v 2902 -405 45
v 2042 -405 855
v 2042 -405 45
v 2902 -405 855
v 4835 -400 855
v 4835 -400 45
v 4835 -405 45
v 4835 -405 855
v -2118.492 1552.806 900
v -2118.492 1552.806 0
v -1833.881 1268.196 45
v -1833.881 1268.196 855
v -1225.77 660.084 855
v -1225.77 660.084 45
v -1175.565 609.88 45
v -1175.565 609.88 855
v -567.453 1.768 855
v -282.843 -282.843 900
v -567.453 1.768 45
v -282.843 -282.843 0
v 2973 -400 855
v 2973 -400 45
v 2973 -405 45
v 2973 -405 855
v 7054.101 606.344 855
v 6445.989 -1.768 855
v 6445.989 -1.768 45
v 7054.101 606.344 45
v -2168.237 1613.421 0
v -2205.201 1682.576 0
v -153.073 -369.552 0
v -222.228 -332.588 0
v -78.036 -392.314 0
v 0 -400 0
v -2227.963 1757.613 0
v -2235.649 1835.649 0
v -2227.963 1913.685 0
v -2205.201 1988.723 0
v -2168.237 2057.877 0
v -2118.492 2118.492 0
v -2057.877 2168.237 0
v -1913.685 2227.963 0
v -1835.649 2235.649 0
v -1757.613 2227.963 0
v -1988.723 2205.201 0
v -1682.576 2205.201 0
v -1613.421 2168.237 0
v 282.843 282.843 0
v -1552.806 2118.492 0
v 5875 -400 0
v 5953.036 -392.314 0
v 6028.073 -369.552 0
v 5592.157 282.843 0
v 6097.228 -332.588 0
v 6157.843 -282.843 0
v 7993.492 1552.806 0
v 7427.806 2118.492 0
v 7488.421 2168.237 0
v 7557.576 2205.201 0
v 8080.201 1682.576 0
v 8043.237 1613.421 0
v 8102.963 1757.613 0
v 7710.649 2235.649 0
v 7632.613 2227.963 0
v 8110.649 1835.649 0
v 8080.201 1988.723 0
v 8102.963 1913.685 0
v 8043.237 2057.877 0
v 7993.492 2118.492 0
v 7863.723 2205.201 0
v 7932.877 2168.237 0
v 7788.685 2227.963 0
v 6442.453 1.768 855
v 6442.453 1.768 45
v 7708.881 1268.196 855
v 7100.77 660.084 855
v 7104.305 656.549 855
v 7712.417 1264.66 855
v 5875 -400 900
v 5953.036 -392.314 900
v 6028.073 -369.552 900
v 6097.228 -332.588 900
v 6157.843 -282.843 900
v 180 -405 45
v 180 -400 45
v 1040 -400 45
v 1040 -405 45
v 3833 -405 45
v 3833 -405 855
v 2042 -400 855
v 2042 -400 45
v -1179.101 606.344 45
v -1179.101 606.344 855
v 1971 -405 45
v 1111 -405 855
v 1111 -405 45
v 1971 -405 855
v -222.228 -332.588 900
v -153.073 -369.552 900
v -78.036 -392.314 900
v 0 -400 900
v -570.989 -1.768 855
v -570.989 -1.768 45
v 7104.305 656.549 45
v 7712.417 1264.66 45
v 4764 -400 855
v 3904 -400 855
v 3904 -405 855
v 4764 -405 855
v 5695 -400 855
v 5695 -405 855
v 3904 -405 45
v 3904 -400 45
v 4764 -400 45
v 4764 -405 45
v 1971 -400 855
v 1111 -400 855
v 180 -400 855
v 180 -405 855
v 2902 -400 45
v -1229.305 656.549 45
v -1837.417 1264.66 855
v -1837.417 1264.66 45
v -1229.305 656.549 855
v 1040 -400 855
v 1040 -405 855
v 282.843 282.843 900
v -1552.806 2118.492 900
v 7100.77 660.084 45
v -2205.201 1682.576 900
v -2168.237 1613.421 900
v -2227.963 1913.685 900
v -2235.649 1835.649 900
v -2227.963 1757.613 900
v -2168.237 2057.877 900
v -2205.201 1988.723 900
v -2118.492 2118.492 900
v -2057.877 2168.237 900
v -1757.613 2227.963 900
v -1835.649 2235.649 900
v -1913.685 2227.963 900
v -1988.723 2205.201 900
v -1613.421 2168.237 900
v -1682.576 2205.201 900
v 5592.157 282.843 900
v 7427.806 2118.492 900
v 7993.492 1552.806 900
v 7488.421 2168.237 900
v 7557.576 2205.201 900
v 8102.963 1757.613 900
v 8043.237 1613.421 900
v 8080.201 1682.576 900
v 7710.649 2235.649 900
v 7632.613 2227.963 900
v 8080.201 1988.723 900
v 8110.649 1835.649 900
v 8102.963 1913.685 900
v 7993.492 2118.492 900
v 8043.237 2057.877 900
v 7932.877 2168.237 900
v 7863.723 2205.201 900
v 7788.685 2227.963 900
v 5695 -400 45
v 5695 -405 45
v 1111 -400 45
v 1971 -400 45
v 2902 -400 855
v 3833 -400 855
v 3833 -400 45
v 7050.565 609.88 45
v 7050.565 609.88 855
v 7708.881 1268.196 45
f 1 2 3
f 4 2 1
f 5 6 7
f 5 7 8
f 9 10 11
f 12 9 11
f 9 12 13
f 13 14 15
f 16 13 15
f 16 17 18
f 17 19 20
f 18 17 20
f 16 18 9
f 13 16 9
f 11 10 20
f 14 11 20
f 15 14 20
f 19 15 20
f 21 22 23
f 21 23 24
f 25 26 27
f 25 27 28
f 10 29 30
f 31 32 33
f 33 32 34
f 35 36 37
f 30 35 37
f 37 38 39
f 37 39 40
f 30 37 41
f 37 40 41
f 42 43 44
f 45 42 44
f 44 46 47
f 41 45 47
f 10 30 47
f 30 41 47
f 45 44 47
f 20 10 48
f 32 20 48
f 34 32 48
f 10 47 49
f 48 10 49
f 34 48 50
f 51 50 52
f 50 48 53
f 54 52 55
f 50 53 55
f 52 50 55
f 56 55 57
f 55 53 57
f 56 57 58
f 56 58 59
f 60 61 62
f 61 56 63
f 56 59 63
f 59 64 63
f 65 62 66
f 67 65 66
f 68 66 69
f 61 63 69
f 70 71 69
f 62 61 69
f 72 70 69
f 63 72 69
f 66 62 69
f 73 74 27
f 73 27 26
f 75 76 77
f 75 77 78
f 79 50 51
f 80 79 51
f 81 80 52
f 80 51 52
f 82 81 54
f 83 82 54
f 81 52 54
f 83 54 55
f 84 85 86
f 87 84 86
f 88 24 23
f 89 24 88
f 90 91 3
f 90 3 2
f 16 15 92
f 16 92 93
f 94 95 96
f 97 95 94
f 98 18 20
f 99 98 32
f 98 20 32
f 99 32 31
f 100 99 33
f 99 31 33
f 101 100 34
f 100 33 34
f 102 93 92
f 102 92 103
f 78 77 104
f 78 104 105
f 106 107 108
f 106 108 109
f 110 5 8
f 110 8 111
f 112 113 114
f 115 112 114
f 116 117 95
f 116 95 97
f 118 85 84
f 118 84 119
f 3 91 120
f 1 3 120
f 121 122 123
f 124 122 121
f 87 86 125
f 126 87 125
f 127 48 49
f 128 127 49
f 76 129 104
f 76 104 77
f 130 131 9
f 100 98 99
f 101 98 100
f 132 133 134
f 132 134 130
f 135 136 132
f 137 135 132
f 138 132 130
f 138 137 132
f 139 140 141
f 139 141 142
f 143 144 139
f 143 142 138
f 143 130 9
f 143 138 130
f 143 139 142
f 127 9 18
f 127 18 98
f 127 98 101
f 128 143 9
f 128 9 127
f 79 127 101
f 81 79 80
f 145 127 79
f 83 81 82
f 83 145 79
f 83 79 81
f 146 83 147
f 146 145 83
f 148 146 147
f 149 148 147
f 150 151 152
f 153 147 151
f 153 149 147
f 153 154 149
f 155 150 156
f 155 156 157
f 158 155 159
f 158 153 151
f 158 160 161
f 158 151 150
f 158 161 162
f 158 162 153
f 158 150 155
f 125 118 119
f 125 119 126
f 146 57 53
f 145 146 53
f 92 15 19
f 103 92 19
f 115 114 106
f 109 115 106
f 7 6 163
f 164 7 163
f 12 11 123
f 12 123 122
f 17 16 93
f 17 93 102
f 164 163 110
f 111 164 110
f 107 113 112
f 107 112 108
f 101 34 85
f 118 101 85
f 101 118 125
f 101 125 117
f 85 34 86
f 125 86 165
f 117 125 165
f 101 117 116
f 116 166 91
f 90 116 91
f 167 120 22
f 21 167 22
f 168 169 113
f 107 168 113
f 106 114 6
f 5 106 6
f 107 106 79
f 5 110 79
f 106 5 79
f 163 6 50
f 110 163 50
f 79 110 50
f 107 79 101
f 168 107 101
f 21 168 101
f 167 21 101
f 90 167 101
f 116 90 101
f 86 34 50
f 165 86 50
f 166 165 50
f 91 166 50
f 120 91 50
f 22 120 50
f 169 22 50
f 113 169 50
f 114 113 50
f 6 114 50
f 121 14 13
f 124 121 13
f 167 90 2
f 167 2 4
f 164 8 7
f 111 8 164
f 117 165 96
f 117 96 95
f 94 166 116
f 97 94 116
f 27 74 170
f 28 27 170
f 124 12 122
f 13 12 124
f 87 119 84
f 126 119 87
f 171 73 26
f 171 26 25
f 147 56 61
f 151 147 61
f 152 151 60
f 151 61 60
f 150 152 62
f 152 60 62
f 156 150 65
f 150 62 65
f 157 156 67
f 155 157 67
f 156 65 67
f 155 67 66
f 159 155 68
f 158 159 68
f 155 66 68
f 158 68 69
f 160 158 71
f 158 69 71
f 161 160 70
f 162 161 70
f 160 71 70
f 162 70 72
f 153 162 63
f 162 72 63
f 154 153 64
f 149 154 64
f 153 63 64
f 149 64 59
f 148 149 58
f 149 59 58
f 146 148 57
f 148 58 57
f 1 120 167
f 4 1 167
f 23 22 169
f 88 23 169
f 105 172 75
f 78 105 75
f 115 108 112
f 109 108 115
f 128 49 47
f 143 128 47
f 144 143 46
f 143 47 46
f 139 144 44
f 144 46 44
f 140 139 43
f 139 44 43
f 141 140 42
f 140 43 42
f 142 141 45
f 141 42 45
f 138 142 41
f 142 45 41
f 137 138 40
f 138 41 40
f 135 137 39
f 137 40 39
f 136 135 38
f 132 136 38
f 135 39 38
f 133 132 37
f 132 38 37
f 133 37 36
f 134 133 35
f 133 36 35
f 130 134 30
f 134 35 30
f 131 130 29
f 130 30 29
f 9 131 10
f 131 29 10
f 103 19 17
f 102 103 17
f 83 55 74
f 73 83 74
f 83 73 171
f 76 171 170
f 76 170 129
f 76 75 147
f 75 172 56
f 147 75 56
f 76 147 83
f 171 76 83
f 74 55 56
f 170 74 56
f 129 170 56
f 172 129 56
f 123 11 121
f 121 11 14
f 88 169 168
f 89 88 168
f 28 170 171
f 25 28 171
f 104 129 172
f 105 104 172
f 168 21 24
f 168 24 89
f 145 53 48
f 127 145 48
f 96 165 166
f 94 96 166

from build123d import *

# Parameters (mm, degrees)
F1_DEPTH = 900
F2_W     = 860
F2_H     = 810
F3_DEPTH = 5
F4_W     = 860
F4_H     = 810
F5_DEPTH = 5
F6_W     = 860
F6_H     = 810
F7_DEPTH = 5


with BuildPart() as f1:
    # F0 (on Top) → F1 (new body)
    with BuildSketch(Plane.XY):
        with BuildLine():
            ThreePointArc((0, -400), (282.8427124746, -282.8427124746), (400, 0))
            ThreePointArc((400, 0), (369.5518130045, 153.073372946), (282.8427124746, 282.8427124746))
            Line((282.8427124746, 282.8427124746), (-282.8427124746, -282.8427124746))
            ThreePointArc((-282.8427124746, -282.8427124746), (-153.073372946, -369.5518130045), (0, -400))
        make_face()
        with BuildLine():
            ThreePointArc((282.8427124746, 282.8427124746), (369.5518130045, 153.073372946), (400, 0))
            ThreePointArc((400, 0), (282.8427124746, -282.8427124746), (0, -400))
            Line((0, -400), (5875, -400))
            ThreePointArc((5875, -400), (5505.4481869955, -153.073372946), (5592.1572875254, 282.8427124746))
            Line((5592.1572875254, 282.8427124746), (282.8427124746, 282.8427124746))
        make_face()
        with BuildLine():
            Line((-282.8427124746, -282.8427124746), (282.8427124746, 282.8427124746))
            ThreePointArc((282.8427124746, 282.8427124746), (-282.8427124746, 282.8427124746), (-282.8427124746, -282.8427124746))
        make_face()
        with BuildLine():
            ThreePointArc((-282.8427124746, -282.8427124746), (-282.8427124746, 282.8427124746), (282.8427124746, 282.8427124746))
            Line((282.8427124746, 282.8427124746), (-1552.8064914857, 2118.4919164349))
            ThreePointArc((-1552.8064914857, 2118.4919164349), (-1466.0973909558, 1988.7225769063), (-1435.6492039603, 1835.6492039603))
            ThreePointArc((-1435.6492039603, 1835.6492039603), (-1682.5758310142, 1466.0973909558), (-2118.4919164349, 1552.8064914857))
            Line((-2118.4919164349, 1552.8064914857), (-282.8427124746, -282.8427124746))
        make_face()
        with BuildLine():
            ThreePointArc((-1435.6492039603, 1835.6492039603), (-1466.0973909558, 1988.7225769063), (-1552.8064914857, 2118.4919164349))
            Line((-1552.8064914857, 2118.4919164349), (-1835.6492039603, 1835.6492039603))
            Line((-1835.6492039603, 1835.6492039603), (-2118.4919164349, 1552.8064914857))
            ThreePointArc((-2118.4919164349, 1552.8064914857), (-1682.5758310142, 1466.0973909558), (-1435.6492039603, 1835.6492039603))
        make_face()
        with BuildLine():
            Line((-1835.6492039603, 1835.6492039603), (-1552.8064914857, 2118.4919164349))
            ThreePointArc((-1552.8064914857, 2118.4919164349), (-2118.4919164349, 2118.4919164349), (-2118.4919164349, 1552.8064914857))
            Line((-2118.4919164349, 1552.8064914857), (-1835.6492039603, 1835.6492039603))
        make_face()
        with BuildLine():
            Line((7427.8064914857, 2118.4919164349), (5592.1572875254, 282.8427124746))
            ThreePointArc((5592.1572875254, 282.8427124746), (6028.073372946, 369.5518130045), (6275, 0))
            ThreePointArc((6275, 0), (6244.5518130045, -153.073372946), (6157.8427124746, -282.8427124746))
            Line((6157.8427124746, -282.8427124746), (7993.4919164349, 1552.8064914857))
            ThreePointArc((7993.4919164349, 1552.8064914857), (7427.8064914857, 1552.8064914857), (7427.8064914857, 2118.4919164349))
        make_face()
        with BuildLine():
            Line((5875, 0), (5592.1572875254, 282.8427124746))
            ThreePointArc((5592.1572875254, 282.8427124746), (5505.4481869955, -153.073372946), (5875, -400))
            ThreePointArc((5875, -400), (6028.073372946, -369.5518130045), (6157.8427124746, -282.8427124746))
            Line((6157.8427124746, -282.8427124746), (5875, 0))
        make_face()
        with BuildLine():
            ThreePointArc((6275, 0), (6028.073372946, 369.5518130045), (5592.1572875254, 282.8427124746))
            Line((5592.1572875254, 282.8427124746), (5875, 0))
            Line((5875, 0), (6157.8427124746, -282.8427124746))
            ThreePointArc((6157.8427124746, -282.8427124746), (6244.5518130045, -153.073372946), (6275, 0))
        make_face()
        with BuildLine():
            ThreePointArc((8110.6492039603, 1835.6492039603), (7863.7225769063, 2205.2010169648), (7427.8064914857, 2118.4919164349))
            Line((7427.8064914857, 2118.4919164349), (7710.6492039603, 1835.6492039603))
            Line((7710.6492039603, 1835.6492039603), (7993.4919164349, 1552.8064914857))
            ThreePointArc((7993.4919164349, 1552.8064914857), (8080.2010169648, 1682.5758310142), (8110.6492039603, 1835.6492039603))
        make_face()
        with BuildLine():
            Line((7710.6492039603, 1835.6492039603), (7427.8064914857, 2118.4919164349))
            ThreePointArc((7427.8064914857, 2118.4919164349), (7427.8064914857, 1552.8064914857), (7993.4919164349, 1552.8064914857))
            Line((7993.4919164349, 1552.8064914857), (7710.6492039603, 1835.6492039603))
        make_face()
    extrude(amount=F1_DEPTH)

    # F2 (on face) → F3 (join)
    with BuildSketch(Plane.XZ.offset(400)):
        with Locations((610, 450)):
            Rectangle(F2_W, F2_H)
        with Locations((1541, 450)):
            Rectangle(F2_W, F2_H)
        with Locations((2472, 450)):
            Rectangle(F2_W, F2_H)
        with Locations((3403, 450)):
            Rectangle(F2_W, F2_H)
        with Locations((4334, 450)):
            Rectangle(F2_W, F2_H)
        with Locations((5265, 450)):
            Rectangle(F2_W, F2_H)
    extrude(amount=F3_DEPTH)

    # F4 (on face) → F5 (join)
    with BuildSketch(Plane(origin=(-282.8427124746, -282.8427124746, 0), x_dir=(0.7071067812, -0.7071067812, 0), z_dir=(-0.7071067812, -0.7071067812, 0))):
        with Locations((-1763.5, 450)):
            Rectangle(F4_W, F4_H)
        with Locations((-832.5, 450)):
            Rectangle(F4_W, F4_H)
    extrude(amount=F5_DEPTH)

    # F6 (on face) → F7 (join)
    with BuildSketch(Plane(origin=(3220.3427124746, -3220.3427124746, 0), x_dir=(0.7071067812, 0.7071067812, 0), z_dir=(0.7071067812, -0.7071067812, 0))):
        with Locations((4986.752339471, 450)):
            Rectangle(F6_W, F6_H)
        with Locations((5917.752339471, 450)):
            Rectangle(F6_W, F6_H)
    extrude(amount=F7_DEPTH)


solid = f1.part
